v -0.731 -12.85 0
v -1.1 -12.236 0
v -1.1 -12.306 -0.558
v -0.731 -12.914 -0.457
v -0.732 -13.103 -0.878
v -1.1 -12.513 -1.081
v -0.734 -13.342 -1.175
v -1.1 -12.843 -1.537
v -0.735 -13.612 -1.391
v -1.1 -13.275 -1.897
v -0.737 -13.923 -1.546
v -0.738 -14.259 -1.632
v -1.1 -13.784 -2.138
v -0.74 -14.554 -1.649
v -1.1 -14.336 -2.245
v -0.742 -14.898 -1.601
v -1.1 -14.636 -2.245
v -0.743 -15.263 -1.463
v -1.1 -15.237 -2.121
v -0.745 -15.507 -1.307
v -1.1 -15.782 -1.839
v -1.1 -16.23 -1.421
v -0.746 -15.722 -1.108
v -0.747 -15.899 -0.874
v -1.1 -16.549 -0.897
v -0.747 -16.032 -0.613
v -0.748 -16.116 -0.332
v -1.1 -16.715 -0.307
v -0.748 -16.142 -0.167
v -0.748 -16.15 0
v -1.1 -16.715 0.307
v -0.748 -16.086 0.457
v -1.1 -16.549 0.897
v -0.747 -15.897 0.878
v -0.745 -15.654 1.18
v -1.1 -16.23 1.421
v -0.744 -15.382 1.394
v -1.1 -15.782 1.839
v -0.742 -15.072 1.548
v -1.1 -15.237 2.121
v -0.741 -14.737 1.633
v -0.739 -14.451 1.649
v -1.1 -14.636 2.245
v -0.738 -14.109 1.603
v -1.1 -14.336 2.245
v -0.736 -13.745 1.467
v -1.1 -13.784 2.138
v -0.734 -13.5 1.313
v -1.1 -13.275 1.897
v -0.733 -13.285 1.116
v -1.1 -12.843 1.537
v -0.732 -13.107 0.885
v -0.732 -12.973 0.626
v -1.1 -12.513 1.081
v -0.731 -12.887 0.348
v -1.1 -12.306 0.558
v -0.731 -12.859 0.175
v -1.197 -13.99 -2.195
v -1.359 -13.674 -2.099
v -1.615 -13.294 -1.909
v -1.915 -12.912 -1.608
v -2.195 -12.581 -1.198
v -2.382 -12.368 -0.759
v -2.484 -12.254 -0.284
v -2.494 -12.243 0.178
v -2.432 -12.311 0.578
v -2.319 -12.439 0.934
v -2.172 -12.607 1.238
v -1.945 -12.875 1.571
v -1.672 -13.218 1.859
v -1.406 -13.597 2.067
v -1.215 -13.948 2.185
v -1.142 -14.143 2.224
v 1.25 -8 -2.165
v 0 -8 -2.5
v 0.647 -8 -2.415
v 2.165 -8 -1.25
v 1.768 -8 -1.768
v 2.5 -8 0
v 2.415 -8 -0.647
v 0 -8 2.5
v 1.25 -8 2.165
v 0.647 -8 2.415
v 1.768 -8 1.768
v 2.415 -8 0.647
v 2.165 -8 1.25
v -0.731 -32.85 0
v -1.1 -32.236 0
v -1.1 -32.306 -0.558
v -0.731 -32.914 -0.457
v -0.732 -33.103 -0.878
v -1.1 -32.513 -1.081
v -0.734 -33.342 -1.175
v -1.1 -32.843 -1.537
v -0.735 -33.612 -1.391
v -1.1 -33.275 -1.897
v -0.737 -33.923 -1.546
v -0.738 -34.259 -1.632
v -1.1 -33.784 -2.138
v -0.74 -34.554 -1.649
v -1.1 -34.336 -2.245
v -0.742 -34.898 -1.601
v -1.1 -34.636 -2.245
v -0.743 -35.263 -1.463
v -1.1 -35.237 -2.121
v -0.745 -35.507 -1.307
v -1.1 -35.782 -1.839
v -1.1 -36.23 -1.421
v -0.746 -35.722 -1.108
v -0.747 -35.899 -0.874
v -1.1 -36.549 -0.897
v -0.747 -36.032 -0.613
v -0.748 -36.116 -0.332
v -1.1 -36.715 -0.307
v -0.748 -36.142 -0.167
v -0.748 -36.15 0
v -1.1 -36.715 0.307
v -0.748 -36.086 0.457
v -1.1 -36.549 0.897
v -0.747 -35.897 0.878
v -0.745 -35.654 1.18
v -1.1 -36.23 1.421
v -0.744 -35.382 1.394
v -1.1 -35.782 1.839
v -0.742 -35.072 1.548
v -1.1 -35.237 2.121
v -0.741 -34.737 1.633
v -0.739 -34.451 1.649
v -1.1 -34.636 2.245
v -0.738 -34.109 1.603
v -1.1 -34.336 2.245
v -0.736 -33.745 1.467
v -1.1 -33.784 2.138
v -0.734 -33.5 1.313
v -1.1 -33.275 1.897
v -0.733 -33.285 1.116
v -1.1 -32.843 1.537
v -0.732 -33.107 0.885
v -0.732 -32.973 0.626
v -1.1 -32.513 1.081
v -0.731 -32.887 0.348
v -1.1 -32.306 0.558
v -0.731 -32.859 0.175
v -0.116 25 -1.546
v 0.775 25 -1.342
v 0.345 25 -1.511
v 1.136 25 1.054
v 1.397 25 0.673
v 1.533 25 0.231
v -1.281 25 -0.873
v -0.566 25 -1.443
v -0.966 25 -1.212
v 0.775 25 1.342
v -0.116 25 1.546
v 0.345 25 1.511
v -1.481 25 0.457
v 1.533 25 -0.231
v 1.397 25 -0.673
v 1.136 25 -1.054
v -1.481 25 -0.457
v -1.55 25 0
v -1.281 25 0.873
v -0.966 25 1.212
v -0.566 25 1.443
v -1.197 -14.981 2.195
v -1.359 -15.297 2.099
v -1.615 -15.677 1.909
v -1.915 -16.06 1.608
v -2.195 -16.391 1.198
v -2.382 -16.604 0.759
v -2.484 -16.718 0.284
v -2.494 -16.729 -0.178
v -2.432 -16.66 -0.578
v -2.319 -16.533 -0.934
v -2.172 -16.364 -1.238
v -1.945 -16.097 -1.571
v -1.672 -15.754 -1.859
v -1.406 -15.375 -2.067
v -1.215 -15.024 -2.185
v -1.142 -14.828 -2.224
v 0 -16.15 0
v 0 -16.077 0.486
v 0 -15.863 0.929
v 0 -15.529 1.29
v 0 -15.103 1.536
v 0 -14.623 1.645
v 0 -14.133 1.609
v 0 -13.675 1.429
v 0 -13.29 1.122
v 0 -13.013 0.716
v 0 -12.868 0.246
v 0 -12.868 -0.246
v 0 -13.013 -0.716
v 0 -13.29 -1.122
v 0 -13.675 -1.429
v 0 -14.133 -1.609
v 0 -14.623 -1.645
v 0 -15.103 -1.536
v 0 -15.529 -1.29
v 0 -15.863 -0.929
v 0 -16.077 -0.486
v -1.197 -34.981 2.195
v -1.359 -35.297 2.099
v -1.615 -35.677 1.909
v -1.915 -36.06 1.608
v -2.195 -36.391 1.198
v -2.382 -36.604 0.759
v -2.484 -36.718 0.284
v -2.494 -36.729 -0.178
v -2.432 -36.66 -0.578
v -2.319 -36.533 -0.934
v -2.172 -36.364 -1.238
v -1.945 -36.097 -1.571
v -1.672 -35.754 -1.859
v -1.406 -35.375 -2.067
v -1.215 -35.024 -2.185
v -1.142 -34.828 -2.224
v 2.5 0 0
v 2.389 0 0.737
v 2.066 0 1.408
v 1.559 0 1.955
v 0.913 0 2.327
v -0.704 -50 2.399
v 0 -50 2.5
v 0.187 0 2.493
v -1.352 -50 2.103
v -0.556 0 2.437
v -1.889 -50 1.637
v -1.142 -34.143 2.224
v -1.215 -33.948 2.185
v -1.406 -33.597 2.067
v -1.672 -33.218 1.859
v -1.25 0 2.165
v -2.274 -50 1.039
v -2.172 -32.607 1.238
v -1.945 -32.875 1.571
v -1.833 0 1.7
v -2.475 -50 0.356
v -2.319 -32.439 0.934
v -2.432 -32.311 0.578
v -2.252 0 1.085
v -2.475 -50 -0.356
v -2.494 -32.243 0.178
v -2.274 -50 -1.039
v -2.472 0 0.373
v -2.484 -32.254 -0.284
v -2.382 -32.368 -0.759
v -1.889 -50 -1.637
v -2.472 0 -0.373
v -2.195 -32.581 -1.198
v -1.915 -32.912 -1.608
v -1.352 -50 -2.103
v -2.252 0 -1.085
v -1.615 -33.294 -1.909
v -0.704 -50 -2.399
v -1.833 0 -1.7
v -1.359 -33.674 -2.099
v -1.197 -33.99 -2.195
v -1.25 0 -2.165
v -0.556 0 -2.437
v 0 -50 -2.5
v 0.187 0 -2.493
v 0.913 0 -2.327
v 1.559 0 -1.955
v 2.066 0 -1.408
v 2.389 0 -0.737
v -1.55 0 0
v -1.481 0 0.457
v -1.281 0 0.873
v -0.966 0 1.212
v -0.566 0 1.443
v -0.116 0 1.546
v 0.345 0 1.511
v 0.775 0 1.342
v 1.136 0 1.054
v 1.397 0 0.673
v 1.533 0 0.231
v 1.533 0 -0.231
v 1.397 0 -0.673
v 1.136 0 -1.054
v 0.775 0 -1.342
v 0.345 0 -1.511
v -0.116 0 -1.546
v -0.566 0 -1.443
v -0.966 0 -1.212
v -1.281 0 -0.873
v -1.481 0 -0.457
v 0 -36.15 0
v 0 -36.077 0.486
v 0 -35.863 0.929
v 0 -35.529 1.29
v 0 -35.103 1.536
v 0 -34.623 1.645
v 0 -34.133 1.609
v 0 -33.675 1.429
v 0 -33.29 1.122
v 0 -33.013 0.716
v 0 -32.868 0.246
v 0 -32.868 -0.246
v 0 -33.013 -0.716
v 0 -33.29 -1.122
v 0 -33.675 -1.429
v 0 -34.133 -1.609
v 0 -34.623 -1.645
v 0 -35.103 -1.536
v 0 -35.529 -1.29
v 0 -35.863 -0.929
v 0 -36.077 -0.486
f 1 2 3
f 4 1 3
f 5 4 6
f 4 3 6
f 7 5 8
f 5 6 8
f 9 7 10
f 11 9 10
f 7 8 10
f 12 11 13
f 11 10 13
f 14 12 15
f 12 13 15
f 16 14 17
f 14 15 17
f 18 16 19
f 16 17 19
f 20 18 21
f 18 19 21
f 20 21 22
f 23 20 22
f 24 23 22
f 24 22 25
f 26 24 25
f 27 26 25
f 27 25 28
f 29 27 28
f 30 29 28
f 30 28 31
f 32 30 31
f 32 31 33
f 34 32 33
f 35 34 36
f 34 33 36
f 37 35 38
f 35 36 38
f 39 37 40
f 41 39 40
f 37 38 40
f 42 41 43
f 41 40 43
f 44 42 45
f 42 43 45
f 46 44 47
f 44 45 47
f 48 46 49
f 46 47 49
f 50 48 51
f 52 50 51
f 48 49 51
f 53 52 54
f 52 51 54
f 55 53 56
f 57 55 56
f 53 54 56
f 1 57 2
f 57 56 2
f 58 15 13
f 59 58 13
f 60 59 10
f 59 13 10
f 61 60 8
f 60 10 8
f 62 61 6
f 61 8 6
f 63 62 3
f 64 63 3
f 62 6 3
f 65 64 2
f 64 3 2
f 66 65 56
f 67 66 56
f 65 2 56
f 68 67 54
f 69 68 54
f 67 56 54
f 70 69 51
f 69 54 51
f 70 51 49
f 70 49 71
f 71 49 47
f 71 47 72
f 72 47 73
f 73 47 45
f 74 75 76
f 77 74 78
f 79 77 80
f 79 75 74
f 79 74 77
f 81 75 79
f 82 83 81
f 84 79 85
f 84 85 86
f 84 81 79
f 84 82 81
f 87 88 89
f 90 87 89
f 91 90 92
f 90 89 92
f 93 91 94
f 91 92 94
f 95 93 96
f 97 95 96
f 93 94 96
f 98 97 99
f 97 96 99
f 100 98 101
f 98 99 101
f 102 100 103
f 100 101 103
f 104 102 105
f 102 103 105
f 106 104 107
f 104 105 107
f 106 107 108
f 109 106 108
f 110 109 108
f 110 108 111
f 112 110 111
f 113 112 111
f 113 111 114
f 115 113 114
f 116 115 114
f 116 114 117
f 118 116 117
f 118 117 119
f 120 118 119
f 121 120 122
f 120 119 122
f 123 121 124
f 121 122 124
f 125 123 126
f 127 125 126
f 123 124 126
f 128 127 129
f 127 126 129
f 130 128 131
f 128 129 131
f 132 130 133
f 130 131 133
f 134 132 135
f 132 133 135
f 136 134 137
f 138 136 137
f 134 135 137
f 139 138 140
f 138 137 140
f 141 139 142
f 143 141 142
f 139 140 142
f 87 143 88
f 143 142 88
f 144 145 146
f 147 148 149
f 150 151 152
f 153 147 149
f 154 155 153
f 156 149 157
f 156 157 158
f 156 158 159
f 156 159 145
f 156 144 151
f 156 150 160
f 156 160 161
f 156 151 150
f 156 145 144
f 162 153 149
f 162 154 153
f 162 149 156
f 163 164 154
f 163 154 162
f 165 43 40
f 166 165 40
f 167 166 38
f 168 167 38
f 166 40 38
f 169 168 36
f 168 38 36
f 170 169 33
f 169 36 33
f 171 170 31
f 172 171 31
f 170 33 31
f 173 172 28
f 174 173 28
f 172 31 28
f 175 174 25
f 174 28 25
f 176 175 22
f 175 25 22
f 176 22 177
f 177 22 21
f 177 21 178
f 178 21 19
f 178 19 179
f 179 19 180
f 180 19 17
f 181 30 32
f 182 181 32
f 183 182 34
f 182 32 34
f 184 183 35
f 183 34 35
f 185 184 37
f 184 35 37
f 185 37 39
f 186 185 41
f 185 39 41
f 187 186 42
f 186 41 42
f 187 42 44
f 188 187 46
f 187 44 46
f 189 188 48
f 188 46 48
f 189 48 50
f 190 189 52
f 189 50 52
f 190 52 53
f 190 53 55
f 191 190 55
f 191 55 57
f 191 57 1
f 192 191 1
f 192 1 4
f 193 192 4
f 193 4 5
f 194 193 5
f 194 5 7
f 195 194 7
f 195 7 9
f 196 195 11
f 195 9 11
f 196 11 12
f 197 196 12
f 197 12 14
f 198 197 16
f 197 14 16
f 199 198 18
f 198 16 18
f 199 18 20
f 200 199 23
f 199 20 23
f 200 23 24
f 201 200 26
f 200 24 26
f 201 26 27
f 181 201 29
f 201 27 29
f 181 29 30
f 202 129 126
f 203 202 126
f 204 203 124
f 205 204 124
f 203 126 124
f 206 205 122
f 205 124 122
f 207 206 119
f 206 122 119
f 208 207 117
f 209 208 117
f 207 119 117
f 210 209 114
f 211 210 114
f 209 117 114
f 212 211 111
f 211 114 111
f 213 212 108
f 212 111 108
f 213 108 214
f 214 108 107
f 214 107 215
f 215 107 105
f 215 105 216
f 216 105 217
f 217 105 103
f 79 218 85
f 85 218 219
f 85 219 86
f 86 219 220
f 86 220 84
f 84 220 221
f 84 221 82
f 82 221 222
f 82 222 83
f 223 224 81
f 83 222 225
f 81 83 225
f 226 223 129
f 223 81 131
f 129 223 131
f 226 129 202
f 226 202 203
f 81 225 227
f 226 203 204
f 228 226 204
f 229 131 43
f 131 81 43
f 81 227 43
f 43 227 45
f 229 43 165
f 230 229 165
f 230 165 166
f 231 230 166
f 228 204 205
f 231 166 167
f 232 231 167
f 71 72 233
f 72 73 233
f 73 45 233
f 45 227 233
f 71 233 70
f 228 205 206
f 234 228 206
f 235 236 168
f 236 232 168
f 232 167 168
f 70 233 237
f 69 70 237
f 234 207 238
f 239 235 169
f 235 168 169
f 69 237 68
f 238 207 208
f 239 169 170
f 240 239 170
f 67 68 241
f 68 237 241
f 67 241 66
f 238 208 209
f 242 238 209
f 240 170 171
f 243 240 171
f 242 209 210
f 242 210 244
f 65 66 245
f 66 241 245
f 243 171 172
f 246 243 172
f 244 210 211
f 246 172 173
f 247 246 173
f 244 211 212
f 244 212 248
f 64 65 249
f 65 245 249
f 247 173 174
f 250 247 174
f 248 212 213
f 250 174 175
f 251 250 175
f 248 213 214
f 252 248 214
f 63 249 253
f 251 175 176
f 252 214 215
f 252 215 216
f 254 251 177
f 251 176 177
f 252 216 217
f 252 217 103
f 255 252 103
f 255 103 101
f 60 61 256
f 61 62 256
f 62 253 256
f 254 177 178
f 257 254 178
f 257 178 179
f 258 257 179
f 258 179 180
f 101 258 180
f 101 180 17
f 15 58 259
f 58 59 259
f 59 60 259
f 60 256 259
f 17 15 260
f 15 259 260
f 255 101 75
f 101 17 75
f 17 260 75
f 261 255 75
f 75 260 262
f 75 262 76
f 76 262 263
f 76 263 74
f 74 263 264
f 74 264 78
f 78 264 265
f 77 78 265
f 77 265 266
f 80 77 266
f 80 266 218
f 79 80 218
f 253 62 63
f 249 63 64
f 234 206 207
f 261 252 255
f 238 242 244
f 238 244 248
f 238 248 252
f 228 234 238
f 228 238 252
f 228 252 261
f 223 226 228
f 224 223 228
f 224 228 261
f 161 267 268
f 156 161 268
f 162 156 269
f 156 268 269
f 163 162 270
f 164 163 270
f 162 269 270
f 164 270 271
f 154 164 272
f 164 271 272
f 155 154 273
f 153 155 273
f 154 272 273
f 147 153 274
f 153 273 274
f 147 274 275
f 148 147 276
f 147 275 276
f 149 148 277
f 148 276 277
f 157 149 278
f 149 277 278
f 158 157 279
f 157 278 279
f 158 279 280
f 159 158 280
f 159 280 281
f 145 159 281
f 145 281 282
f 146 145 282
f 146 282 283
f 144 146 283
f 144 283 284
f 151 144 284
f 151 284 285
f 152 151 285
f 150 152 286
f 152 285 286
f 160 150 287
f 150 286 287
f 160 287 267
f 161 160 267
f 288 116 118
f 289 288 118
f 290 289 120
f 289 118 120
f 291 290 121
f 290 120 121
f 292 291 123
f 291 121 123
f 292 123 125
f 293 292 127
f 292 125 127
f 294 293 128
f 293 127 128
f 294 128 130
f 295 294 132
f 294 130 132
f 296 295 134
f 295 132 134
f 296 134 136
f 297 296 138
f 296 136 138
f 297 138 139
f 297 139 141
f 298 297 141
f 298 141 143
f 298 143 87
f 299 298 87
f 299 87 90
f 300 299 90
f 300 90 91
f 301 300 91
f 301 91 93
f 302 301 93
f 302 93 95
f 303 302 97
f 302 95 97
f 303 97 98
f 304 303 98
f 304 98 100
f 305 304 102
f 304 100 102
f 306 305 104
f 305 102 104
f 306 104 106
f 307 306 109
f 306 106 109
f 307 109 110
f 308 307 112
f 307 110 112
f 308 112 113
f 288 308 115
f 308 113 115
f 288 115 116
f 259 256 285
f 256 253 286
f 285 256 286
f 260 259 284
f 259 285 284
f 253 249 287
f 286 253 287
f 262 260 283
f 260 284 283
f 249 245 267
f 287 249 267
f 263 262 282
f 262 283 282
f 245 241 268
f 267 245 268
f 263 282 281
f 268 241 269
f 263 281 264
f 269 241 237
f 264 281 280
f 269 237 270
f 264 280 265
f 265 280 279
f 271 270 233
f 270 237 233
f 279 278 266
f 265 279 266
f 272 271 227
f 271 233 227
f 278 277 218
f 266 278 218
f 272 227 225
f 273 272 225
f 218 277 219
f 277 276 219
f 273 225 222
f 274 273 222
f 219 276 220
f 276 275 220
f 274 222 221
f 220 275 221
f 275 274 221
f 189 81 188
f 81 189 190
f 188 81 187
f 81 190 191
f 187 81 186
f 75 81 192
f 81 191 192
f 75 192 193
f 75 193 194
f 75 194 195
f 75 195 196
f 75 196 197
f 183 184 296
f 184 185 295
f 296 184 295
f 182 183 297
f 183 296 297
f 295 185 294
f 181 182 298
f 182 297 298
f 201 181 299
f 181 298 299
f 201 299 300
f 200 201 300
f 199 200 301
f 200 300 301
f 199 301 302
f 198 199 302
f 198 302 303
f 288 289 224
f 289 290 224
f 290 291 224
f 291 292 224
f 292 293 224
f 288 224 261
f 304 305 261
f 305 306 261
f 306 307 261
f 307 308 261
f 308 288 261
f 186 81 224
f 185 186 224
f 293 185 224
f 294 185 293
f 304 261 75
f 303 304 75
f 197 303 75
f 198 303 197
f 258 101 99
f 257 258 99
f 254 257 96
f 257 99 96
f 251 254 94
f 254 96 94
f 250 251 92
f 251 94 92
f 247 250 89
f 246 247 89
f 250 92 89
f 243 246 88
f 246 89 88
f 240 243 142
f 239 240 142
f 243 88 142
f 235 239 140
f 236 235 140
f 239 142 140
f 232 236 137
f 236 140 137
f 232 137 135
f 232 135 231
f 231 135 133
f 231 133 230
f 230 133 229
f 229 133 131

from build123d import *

# Parameters (mm, degrees)
F0_R      = 2.5
F1_DEPTH  = 50
F2_R      = 1.55
F3_DEPTH  = 25
F5_DEPTH  = 42
F7_D      = 3.3
F10_D     = 4.5
F10_DEPTH = 1.4
F10_TIP   = 1.3519363928


with BuildPart() as f1:
    # F0 (on Front) → F1 (new body)
    with BuildSketch(Plane.XZ):
        Circle(F0_R)
    extrude(amount=F1_DEPTH)

    # F2 (on face) → F3 (join)
    with BuildSketch(Plane(origin=(0, 0, 0), x_dir=(-1, 0, 0), z_dir=(0, 1, 0))):
        Circle(F2_R)
    extrude(amount=F3_DEPTH)

    # F4 (on face) → F5 (cut)
    with BuildSketch(Plane.XZ.offset(50)):
        with BuildLine():
            ThreePointArc((2.5, 0), (1.767766953, 1.767766953), (0, 2.5))
            Line((0, 2.5), (0, -2.5))
            ThreePointArc((0, -2.5), (1.767766953, -1.767766953), (2.5, 0))
        make_face()
    extrude(amount=-F5_DEPTH, mode=Mode.SUBTRACT)

    # F7 (through all)
    with Locations(Plane.YZ):
        with Locations((-34.5, 0), (-14.5, 0)):
            Hole(F7_D / 2)

    # F10
    with Locations(Plane(origin=(-2.5, 0, 0), x_dir=(0, 1, 0), z_dir=(-1, 0, 0))):
        with Locations((-34.4858653843, 0), (-14.4858653843, 0)):
            Hole(F10_D / 2, depth=F10_DEPTH)
            with Locations((0, 0, -(F10_DEPTH + F10_TIP / 2))):  # 118° drill point
                Cone(0, F10_D / 2, F10_TIP, mode=Mode.SUBTRACT)


solid = f1.part
